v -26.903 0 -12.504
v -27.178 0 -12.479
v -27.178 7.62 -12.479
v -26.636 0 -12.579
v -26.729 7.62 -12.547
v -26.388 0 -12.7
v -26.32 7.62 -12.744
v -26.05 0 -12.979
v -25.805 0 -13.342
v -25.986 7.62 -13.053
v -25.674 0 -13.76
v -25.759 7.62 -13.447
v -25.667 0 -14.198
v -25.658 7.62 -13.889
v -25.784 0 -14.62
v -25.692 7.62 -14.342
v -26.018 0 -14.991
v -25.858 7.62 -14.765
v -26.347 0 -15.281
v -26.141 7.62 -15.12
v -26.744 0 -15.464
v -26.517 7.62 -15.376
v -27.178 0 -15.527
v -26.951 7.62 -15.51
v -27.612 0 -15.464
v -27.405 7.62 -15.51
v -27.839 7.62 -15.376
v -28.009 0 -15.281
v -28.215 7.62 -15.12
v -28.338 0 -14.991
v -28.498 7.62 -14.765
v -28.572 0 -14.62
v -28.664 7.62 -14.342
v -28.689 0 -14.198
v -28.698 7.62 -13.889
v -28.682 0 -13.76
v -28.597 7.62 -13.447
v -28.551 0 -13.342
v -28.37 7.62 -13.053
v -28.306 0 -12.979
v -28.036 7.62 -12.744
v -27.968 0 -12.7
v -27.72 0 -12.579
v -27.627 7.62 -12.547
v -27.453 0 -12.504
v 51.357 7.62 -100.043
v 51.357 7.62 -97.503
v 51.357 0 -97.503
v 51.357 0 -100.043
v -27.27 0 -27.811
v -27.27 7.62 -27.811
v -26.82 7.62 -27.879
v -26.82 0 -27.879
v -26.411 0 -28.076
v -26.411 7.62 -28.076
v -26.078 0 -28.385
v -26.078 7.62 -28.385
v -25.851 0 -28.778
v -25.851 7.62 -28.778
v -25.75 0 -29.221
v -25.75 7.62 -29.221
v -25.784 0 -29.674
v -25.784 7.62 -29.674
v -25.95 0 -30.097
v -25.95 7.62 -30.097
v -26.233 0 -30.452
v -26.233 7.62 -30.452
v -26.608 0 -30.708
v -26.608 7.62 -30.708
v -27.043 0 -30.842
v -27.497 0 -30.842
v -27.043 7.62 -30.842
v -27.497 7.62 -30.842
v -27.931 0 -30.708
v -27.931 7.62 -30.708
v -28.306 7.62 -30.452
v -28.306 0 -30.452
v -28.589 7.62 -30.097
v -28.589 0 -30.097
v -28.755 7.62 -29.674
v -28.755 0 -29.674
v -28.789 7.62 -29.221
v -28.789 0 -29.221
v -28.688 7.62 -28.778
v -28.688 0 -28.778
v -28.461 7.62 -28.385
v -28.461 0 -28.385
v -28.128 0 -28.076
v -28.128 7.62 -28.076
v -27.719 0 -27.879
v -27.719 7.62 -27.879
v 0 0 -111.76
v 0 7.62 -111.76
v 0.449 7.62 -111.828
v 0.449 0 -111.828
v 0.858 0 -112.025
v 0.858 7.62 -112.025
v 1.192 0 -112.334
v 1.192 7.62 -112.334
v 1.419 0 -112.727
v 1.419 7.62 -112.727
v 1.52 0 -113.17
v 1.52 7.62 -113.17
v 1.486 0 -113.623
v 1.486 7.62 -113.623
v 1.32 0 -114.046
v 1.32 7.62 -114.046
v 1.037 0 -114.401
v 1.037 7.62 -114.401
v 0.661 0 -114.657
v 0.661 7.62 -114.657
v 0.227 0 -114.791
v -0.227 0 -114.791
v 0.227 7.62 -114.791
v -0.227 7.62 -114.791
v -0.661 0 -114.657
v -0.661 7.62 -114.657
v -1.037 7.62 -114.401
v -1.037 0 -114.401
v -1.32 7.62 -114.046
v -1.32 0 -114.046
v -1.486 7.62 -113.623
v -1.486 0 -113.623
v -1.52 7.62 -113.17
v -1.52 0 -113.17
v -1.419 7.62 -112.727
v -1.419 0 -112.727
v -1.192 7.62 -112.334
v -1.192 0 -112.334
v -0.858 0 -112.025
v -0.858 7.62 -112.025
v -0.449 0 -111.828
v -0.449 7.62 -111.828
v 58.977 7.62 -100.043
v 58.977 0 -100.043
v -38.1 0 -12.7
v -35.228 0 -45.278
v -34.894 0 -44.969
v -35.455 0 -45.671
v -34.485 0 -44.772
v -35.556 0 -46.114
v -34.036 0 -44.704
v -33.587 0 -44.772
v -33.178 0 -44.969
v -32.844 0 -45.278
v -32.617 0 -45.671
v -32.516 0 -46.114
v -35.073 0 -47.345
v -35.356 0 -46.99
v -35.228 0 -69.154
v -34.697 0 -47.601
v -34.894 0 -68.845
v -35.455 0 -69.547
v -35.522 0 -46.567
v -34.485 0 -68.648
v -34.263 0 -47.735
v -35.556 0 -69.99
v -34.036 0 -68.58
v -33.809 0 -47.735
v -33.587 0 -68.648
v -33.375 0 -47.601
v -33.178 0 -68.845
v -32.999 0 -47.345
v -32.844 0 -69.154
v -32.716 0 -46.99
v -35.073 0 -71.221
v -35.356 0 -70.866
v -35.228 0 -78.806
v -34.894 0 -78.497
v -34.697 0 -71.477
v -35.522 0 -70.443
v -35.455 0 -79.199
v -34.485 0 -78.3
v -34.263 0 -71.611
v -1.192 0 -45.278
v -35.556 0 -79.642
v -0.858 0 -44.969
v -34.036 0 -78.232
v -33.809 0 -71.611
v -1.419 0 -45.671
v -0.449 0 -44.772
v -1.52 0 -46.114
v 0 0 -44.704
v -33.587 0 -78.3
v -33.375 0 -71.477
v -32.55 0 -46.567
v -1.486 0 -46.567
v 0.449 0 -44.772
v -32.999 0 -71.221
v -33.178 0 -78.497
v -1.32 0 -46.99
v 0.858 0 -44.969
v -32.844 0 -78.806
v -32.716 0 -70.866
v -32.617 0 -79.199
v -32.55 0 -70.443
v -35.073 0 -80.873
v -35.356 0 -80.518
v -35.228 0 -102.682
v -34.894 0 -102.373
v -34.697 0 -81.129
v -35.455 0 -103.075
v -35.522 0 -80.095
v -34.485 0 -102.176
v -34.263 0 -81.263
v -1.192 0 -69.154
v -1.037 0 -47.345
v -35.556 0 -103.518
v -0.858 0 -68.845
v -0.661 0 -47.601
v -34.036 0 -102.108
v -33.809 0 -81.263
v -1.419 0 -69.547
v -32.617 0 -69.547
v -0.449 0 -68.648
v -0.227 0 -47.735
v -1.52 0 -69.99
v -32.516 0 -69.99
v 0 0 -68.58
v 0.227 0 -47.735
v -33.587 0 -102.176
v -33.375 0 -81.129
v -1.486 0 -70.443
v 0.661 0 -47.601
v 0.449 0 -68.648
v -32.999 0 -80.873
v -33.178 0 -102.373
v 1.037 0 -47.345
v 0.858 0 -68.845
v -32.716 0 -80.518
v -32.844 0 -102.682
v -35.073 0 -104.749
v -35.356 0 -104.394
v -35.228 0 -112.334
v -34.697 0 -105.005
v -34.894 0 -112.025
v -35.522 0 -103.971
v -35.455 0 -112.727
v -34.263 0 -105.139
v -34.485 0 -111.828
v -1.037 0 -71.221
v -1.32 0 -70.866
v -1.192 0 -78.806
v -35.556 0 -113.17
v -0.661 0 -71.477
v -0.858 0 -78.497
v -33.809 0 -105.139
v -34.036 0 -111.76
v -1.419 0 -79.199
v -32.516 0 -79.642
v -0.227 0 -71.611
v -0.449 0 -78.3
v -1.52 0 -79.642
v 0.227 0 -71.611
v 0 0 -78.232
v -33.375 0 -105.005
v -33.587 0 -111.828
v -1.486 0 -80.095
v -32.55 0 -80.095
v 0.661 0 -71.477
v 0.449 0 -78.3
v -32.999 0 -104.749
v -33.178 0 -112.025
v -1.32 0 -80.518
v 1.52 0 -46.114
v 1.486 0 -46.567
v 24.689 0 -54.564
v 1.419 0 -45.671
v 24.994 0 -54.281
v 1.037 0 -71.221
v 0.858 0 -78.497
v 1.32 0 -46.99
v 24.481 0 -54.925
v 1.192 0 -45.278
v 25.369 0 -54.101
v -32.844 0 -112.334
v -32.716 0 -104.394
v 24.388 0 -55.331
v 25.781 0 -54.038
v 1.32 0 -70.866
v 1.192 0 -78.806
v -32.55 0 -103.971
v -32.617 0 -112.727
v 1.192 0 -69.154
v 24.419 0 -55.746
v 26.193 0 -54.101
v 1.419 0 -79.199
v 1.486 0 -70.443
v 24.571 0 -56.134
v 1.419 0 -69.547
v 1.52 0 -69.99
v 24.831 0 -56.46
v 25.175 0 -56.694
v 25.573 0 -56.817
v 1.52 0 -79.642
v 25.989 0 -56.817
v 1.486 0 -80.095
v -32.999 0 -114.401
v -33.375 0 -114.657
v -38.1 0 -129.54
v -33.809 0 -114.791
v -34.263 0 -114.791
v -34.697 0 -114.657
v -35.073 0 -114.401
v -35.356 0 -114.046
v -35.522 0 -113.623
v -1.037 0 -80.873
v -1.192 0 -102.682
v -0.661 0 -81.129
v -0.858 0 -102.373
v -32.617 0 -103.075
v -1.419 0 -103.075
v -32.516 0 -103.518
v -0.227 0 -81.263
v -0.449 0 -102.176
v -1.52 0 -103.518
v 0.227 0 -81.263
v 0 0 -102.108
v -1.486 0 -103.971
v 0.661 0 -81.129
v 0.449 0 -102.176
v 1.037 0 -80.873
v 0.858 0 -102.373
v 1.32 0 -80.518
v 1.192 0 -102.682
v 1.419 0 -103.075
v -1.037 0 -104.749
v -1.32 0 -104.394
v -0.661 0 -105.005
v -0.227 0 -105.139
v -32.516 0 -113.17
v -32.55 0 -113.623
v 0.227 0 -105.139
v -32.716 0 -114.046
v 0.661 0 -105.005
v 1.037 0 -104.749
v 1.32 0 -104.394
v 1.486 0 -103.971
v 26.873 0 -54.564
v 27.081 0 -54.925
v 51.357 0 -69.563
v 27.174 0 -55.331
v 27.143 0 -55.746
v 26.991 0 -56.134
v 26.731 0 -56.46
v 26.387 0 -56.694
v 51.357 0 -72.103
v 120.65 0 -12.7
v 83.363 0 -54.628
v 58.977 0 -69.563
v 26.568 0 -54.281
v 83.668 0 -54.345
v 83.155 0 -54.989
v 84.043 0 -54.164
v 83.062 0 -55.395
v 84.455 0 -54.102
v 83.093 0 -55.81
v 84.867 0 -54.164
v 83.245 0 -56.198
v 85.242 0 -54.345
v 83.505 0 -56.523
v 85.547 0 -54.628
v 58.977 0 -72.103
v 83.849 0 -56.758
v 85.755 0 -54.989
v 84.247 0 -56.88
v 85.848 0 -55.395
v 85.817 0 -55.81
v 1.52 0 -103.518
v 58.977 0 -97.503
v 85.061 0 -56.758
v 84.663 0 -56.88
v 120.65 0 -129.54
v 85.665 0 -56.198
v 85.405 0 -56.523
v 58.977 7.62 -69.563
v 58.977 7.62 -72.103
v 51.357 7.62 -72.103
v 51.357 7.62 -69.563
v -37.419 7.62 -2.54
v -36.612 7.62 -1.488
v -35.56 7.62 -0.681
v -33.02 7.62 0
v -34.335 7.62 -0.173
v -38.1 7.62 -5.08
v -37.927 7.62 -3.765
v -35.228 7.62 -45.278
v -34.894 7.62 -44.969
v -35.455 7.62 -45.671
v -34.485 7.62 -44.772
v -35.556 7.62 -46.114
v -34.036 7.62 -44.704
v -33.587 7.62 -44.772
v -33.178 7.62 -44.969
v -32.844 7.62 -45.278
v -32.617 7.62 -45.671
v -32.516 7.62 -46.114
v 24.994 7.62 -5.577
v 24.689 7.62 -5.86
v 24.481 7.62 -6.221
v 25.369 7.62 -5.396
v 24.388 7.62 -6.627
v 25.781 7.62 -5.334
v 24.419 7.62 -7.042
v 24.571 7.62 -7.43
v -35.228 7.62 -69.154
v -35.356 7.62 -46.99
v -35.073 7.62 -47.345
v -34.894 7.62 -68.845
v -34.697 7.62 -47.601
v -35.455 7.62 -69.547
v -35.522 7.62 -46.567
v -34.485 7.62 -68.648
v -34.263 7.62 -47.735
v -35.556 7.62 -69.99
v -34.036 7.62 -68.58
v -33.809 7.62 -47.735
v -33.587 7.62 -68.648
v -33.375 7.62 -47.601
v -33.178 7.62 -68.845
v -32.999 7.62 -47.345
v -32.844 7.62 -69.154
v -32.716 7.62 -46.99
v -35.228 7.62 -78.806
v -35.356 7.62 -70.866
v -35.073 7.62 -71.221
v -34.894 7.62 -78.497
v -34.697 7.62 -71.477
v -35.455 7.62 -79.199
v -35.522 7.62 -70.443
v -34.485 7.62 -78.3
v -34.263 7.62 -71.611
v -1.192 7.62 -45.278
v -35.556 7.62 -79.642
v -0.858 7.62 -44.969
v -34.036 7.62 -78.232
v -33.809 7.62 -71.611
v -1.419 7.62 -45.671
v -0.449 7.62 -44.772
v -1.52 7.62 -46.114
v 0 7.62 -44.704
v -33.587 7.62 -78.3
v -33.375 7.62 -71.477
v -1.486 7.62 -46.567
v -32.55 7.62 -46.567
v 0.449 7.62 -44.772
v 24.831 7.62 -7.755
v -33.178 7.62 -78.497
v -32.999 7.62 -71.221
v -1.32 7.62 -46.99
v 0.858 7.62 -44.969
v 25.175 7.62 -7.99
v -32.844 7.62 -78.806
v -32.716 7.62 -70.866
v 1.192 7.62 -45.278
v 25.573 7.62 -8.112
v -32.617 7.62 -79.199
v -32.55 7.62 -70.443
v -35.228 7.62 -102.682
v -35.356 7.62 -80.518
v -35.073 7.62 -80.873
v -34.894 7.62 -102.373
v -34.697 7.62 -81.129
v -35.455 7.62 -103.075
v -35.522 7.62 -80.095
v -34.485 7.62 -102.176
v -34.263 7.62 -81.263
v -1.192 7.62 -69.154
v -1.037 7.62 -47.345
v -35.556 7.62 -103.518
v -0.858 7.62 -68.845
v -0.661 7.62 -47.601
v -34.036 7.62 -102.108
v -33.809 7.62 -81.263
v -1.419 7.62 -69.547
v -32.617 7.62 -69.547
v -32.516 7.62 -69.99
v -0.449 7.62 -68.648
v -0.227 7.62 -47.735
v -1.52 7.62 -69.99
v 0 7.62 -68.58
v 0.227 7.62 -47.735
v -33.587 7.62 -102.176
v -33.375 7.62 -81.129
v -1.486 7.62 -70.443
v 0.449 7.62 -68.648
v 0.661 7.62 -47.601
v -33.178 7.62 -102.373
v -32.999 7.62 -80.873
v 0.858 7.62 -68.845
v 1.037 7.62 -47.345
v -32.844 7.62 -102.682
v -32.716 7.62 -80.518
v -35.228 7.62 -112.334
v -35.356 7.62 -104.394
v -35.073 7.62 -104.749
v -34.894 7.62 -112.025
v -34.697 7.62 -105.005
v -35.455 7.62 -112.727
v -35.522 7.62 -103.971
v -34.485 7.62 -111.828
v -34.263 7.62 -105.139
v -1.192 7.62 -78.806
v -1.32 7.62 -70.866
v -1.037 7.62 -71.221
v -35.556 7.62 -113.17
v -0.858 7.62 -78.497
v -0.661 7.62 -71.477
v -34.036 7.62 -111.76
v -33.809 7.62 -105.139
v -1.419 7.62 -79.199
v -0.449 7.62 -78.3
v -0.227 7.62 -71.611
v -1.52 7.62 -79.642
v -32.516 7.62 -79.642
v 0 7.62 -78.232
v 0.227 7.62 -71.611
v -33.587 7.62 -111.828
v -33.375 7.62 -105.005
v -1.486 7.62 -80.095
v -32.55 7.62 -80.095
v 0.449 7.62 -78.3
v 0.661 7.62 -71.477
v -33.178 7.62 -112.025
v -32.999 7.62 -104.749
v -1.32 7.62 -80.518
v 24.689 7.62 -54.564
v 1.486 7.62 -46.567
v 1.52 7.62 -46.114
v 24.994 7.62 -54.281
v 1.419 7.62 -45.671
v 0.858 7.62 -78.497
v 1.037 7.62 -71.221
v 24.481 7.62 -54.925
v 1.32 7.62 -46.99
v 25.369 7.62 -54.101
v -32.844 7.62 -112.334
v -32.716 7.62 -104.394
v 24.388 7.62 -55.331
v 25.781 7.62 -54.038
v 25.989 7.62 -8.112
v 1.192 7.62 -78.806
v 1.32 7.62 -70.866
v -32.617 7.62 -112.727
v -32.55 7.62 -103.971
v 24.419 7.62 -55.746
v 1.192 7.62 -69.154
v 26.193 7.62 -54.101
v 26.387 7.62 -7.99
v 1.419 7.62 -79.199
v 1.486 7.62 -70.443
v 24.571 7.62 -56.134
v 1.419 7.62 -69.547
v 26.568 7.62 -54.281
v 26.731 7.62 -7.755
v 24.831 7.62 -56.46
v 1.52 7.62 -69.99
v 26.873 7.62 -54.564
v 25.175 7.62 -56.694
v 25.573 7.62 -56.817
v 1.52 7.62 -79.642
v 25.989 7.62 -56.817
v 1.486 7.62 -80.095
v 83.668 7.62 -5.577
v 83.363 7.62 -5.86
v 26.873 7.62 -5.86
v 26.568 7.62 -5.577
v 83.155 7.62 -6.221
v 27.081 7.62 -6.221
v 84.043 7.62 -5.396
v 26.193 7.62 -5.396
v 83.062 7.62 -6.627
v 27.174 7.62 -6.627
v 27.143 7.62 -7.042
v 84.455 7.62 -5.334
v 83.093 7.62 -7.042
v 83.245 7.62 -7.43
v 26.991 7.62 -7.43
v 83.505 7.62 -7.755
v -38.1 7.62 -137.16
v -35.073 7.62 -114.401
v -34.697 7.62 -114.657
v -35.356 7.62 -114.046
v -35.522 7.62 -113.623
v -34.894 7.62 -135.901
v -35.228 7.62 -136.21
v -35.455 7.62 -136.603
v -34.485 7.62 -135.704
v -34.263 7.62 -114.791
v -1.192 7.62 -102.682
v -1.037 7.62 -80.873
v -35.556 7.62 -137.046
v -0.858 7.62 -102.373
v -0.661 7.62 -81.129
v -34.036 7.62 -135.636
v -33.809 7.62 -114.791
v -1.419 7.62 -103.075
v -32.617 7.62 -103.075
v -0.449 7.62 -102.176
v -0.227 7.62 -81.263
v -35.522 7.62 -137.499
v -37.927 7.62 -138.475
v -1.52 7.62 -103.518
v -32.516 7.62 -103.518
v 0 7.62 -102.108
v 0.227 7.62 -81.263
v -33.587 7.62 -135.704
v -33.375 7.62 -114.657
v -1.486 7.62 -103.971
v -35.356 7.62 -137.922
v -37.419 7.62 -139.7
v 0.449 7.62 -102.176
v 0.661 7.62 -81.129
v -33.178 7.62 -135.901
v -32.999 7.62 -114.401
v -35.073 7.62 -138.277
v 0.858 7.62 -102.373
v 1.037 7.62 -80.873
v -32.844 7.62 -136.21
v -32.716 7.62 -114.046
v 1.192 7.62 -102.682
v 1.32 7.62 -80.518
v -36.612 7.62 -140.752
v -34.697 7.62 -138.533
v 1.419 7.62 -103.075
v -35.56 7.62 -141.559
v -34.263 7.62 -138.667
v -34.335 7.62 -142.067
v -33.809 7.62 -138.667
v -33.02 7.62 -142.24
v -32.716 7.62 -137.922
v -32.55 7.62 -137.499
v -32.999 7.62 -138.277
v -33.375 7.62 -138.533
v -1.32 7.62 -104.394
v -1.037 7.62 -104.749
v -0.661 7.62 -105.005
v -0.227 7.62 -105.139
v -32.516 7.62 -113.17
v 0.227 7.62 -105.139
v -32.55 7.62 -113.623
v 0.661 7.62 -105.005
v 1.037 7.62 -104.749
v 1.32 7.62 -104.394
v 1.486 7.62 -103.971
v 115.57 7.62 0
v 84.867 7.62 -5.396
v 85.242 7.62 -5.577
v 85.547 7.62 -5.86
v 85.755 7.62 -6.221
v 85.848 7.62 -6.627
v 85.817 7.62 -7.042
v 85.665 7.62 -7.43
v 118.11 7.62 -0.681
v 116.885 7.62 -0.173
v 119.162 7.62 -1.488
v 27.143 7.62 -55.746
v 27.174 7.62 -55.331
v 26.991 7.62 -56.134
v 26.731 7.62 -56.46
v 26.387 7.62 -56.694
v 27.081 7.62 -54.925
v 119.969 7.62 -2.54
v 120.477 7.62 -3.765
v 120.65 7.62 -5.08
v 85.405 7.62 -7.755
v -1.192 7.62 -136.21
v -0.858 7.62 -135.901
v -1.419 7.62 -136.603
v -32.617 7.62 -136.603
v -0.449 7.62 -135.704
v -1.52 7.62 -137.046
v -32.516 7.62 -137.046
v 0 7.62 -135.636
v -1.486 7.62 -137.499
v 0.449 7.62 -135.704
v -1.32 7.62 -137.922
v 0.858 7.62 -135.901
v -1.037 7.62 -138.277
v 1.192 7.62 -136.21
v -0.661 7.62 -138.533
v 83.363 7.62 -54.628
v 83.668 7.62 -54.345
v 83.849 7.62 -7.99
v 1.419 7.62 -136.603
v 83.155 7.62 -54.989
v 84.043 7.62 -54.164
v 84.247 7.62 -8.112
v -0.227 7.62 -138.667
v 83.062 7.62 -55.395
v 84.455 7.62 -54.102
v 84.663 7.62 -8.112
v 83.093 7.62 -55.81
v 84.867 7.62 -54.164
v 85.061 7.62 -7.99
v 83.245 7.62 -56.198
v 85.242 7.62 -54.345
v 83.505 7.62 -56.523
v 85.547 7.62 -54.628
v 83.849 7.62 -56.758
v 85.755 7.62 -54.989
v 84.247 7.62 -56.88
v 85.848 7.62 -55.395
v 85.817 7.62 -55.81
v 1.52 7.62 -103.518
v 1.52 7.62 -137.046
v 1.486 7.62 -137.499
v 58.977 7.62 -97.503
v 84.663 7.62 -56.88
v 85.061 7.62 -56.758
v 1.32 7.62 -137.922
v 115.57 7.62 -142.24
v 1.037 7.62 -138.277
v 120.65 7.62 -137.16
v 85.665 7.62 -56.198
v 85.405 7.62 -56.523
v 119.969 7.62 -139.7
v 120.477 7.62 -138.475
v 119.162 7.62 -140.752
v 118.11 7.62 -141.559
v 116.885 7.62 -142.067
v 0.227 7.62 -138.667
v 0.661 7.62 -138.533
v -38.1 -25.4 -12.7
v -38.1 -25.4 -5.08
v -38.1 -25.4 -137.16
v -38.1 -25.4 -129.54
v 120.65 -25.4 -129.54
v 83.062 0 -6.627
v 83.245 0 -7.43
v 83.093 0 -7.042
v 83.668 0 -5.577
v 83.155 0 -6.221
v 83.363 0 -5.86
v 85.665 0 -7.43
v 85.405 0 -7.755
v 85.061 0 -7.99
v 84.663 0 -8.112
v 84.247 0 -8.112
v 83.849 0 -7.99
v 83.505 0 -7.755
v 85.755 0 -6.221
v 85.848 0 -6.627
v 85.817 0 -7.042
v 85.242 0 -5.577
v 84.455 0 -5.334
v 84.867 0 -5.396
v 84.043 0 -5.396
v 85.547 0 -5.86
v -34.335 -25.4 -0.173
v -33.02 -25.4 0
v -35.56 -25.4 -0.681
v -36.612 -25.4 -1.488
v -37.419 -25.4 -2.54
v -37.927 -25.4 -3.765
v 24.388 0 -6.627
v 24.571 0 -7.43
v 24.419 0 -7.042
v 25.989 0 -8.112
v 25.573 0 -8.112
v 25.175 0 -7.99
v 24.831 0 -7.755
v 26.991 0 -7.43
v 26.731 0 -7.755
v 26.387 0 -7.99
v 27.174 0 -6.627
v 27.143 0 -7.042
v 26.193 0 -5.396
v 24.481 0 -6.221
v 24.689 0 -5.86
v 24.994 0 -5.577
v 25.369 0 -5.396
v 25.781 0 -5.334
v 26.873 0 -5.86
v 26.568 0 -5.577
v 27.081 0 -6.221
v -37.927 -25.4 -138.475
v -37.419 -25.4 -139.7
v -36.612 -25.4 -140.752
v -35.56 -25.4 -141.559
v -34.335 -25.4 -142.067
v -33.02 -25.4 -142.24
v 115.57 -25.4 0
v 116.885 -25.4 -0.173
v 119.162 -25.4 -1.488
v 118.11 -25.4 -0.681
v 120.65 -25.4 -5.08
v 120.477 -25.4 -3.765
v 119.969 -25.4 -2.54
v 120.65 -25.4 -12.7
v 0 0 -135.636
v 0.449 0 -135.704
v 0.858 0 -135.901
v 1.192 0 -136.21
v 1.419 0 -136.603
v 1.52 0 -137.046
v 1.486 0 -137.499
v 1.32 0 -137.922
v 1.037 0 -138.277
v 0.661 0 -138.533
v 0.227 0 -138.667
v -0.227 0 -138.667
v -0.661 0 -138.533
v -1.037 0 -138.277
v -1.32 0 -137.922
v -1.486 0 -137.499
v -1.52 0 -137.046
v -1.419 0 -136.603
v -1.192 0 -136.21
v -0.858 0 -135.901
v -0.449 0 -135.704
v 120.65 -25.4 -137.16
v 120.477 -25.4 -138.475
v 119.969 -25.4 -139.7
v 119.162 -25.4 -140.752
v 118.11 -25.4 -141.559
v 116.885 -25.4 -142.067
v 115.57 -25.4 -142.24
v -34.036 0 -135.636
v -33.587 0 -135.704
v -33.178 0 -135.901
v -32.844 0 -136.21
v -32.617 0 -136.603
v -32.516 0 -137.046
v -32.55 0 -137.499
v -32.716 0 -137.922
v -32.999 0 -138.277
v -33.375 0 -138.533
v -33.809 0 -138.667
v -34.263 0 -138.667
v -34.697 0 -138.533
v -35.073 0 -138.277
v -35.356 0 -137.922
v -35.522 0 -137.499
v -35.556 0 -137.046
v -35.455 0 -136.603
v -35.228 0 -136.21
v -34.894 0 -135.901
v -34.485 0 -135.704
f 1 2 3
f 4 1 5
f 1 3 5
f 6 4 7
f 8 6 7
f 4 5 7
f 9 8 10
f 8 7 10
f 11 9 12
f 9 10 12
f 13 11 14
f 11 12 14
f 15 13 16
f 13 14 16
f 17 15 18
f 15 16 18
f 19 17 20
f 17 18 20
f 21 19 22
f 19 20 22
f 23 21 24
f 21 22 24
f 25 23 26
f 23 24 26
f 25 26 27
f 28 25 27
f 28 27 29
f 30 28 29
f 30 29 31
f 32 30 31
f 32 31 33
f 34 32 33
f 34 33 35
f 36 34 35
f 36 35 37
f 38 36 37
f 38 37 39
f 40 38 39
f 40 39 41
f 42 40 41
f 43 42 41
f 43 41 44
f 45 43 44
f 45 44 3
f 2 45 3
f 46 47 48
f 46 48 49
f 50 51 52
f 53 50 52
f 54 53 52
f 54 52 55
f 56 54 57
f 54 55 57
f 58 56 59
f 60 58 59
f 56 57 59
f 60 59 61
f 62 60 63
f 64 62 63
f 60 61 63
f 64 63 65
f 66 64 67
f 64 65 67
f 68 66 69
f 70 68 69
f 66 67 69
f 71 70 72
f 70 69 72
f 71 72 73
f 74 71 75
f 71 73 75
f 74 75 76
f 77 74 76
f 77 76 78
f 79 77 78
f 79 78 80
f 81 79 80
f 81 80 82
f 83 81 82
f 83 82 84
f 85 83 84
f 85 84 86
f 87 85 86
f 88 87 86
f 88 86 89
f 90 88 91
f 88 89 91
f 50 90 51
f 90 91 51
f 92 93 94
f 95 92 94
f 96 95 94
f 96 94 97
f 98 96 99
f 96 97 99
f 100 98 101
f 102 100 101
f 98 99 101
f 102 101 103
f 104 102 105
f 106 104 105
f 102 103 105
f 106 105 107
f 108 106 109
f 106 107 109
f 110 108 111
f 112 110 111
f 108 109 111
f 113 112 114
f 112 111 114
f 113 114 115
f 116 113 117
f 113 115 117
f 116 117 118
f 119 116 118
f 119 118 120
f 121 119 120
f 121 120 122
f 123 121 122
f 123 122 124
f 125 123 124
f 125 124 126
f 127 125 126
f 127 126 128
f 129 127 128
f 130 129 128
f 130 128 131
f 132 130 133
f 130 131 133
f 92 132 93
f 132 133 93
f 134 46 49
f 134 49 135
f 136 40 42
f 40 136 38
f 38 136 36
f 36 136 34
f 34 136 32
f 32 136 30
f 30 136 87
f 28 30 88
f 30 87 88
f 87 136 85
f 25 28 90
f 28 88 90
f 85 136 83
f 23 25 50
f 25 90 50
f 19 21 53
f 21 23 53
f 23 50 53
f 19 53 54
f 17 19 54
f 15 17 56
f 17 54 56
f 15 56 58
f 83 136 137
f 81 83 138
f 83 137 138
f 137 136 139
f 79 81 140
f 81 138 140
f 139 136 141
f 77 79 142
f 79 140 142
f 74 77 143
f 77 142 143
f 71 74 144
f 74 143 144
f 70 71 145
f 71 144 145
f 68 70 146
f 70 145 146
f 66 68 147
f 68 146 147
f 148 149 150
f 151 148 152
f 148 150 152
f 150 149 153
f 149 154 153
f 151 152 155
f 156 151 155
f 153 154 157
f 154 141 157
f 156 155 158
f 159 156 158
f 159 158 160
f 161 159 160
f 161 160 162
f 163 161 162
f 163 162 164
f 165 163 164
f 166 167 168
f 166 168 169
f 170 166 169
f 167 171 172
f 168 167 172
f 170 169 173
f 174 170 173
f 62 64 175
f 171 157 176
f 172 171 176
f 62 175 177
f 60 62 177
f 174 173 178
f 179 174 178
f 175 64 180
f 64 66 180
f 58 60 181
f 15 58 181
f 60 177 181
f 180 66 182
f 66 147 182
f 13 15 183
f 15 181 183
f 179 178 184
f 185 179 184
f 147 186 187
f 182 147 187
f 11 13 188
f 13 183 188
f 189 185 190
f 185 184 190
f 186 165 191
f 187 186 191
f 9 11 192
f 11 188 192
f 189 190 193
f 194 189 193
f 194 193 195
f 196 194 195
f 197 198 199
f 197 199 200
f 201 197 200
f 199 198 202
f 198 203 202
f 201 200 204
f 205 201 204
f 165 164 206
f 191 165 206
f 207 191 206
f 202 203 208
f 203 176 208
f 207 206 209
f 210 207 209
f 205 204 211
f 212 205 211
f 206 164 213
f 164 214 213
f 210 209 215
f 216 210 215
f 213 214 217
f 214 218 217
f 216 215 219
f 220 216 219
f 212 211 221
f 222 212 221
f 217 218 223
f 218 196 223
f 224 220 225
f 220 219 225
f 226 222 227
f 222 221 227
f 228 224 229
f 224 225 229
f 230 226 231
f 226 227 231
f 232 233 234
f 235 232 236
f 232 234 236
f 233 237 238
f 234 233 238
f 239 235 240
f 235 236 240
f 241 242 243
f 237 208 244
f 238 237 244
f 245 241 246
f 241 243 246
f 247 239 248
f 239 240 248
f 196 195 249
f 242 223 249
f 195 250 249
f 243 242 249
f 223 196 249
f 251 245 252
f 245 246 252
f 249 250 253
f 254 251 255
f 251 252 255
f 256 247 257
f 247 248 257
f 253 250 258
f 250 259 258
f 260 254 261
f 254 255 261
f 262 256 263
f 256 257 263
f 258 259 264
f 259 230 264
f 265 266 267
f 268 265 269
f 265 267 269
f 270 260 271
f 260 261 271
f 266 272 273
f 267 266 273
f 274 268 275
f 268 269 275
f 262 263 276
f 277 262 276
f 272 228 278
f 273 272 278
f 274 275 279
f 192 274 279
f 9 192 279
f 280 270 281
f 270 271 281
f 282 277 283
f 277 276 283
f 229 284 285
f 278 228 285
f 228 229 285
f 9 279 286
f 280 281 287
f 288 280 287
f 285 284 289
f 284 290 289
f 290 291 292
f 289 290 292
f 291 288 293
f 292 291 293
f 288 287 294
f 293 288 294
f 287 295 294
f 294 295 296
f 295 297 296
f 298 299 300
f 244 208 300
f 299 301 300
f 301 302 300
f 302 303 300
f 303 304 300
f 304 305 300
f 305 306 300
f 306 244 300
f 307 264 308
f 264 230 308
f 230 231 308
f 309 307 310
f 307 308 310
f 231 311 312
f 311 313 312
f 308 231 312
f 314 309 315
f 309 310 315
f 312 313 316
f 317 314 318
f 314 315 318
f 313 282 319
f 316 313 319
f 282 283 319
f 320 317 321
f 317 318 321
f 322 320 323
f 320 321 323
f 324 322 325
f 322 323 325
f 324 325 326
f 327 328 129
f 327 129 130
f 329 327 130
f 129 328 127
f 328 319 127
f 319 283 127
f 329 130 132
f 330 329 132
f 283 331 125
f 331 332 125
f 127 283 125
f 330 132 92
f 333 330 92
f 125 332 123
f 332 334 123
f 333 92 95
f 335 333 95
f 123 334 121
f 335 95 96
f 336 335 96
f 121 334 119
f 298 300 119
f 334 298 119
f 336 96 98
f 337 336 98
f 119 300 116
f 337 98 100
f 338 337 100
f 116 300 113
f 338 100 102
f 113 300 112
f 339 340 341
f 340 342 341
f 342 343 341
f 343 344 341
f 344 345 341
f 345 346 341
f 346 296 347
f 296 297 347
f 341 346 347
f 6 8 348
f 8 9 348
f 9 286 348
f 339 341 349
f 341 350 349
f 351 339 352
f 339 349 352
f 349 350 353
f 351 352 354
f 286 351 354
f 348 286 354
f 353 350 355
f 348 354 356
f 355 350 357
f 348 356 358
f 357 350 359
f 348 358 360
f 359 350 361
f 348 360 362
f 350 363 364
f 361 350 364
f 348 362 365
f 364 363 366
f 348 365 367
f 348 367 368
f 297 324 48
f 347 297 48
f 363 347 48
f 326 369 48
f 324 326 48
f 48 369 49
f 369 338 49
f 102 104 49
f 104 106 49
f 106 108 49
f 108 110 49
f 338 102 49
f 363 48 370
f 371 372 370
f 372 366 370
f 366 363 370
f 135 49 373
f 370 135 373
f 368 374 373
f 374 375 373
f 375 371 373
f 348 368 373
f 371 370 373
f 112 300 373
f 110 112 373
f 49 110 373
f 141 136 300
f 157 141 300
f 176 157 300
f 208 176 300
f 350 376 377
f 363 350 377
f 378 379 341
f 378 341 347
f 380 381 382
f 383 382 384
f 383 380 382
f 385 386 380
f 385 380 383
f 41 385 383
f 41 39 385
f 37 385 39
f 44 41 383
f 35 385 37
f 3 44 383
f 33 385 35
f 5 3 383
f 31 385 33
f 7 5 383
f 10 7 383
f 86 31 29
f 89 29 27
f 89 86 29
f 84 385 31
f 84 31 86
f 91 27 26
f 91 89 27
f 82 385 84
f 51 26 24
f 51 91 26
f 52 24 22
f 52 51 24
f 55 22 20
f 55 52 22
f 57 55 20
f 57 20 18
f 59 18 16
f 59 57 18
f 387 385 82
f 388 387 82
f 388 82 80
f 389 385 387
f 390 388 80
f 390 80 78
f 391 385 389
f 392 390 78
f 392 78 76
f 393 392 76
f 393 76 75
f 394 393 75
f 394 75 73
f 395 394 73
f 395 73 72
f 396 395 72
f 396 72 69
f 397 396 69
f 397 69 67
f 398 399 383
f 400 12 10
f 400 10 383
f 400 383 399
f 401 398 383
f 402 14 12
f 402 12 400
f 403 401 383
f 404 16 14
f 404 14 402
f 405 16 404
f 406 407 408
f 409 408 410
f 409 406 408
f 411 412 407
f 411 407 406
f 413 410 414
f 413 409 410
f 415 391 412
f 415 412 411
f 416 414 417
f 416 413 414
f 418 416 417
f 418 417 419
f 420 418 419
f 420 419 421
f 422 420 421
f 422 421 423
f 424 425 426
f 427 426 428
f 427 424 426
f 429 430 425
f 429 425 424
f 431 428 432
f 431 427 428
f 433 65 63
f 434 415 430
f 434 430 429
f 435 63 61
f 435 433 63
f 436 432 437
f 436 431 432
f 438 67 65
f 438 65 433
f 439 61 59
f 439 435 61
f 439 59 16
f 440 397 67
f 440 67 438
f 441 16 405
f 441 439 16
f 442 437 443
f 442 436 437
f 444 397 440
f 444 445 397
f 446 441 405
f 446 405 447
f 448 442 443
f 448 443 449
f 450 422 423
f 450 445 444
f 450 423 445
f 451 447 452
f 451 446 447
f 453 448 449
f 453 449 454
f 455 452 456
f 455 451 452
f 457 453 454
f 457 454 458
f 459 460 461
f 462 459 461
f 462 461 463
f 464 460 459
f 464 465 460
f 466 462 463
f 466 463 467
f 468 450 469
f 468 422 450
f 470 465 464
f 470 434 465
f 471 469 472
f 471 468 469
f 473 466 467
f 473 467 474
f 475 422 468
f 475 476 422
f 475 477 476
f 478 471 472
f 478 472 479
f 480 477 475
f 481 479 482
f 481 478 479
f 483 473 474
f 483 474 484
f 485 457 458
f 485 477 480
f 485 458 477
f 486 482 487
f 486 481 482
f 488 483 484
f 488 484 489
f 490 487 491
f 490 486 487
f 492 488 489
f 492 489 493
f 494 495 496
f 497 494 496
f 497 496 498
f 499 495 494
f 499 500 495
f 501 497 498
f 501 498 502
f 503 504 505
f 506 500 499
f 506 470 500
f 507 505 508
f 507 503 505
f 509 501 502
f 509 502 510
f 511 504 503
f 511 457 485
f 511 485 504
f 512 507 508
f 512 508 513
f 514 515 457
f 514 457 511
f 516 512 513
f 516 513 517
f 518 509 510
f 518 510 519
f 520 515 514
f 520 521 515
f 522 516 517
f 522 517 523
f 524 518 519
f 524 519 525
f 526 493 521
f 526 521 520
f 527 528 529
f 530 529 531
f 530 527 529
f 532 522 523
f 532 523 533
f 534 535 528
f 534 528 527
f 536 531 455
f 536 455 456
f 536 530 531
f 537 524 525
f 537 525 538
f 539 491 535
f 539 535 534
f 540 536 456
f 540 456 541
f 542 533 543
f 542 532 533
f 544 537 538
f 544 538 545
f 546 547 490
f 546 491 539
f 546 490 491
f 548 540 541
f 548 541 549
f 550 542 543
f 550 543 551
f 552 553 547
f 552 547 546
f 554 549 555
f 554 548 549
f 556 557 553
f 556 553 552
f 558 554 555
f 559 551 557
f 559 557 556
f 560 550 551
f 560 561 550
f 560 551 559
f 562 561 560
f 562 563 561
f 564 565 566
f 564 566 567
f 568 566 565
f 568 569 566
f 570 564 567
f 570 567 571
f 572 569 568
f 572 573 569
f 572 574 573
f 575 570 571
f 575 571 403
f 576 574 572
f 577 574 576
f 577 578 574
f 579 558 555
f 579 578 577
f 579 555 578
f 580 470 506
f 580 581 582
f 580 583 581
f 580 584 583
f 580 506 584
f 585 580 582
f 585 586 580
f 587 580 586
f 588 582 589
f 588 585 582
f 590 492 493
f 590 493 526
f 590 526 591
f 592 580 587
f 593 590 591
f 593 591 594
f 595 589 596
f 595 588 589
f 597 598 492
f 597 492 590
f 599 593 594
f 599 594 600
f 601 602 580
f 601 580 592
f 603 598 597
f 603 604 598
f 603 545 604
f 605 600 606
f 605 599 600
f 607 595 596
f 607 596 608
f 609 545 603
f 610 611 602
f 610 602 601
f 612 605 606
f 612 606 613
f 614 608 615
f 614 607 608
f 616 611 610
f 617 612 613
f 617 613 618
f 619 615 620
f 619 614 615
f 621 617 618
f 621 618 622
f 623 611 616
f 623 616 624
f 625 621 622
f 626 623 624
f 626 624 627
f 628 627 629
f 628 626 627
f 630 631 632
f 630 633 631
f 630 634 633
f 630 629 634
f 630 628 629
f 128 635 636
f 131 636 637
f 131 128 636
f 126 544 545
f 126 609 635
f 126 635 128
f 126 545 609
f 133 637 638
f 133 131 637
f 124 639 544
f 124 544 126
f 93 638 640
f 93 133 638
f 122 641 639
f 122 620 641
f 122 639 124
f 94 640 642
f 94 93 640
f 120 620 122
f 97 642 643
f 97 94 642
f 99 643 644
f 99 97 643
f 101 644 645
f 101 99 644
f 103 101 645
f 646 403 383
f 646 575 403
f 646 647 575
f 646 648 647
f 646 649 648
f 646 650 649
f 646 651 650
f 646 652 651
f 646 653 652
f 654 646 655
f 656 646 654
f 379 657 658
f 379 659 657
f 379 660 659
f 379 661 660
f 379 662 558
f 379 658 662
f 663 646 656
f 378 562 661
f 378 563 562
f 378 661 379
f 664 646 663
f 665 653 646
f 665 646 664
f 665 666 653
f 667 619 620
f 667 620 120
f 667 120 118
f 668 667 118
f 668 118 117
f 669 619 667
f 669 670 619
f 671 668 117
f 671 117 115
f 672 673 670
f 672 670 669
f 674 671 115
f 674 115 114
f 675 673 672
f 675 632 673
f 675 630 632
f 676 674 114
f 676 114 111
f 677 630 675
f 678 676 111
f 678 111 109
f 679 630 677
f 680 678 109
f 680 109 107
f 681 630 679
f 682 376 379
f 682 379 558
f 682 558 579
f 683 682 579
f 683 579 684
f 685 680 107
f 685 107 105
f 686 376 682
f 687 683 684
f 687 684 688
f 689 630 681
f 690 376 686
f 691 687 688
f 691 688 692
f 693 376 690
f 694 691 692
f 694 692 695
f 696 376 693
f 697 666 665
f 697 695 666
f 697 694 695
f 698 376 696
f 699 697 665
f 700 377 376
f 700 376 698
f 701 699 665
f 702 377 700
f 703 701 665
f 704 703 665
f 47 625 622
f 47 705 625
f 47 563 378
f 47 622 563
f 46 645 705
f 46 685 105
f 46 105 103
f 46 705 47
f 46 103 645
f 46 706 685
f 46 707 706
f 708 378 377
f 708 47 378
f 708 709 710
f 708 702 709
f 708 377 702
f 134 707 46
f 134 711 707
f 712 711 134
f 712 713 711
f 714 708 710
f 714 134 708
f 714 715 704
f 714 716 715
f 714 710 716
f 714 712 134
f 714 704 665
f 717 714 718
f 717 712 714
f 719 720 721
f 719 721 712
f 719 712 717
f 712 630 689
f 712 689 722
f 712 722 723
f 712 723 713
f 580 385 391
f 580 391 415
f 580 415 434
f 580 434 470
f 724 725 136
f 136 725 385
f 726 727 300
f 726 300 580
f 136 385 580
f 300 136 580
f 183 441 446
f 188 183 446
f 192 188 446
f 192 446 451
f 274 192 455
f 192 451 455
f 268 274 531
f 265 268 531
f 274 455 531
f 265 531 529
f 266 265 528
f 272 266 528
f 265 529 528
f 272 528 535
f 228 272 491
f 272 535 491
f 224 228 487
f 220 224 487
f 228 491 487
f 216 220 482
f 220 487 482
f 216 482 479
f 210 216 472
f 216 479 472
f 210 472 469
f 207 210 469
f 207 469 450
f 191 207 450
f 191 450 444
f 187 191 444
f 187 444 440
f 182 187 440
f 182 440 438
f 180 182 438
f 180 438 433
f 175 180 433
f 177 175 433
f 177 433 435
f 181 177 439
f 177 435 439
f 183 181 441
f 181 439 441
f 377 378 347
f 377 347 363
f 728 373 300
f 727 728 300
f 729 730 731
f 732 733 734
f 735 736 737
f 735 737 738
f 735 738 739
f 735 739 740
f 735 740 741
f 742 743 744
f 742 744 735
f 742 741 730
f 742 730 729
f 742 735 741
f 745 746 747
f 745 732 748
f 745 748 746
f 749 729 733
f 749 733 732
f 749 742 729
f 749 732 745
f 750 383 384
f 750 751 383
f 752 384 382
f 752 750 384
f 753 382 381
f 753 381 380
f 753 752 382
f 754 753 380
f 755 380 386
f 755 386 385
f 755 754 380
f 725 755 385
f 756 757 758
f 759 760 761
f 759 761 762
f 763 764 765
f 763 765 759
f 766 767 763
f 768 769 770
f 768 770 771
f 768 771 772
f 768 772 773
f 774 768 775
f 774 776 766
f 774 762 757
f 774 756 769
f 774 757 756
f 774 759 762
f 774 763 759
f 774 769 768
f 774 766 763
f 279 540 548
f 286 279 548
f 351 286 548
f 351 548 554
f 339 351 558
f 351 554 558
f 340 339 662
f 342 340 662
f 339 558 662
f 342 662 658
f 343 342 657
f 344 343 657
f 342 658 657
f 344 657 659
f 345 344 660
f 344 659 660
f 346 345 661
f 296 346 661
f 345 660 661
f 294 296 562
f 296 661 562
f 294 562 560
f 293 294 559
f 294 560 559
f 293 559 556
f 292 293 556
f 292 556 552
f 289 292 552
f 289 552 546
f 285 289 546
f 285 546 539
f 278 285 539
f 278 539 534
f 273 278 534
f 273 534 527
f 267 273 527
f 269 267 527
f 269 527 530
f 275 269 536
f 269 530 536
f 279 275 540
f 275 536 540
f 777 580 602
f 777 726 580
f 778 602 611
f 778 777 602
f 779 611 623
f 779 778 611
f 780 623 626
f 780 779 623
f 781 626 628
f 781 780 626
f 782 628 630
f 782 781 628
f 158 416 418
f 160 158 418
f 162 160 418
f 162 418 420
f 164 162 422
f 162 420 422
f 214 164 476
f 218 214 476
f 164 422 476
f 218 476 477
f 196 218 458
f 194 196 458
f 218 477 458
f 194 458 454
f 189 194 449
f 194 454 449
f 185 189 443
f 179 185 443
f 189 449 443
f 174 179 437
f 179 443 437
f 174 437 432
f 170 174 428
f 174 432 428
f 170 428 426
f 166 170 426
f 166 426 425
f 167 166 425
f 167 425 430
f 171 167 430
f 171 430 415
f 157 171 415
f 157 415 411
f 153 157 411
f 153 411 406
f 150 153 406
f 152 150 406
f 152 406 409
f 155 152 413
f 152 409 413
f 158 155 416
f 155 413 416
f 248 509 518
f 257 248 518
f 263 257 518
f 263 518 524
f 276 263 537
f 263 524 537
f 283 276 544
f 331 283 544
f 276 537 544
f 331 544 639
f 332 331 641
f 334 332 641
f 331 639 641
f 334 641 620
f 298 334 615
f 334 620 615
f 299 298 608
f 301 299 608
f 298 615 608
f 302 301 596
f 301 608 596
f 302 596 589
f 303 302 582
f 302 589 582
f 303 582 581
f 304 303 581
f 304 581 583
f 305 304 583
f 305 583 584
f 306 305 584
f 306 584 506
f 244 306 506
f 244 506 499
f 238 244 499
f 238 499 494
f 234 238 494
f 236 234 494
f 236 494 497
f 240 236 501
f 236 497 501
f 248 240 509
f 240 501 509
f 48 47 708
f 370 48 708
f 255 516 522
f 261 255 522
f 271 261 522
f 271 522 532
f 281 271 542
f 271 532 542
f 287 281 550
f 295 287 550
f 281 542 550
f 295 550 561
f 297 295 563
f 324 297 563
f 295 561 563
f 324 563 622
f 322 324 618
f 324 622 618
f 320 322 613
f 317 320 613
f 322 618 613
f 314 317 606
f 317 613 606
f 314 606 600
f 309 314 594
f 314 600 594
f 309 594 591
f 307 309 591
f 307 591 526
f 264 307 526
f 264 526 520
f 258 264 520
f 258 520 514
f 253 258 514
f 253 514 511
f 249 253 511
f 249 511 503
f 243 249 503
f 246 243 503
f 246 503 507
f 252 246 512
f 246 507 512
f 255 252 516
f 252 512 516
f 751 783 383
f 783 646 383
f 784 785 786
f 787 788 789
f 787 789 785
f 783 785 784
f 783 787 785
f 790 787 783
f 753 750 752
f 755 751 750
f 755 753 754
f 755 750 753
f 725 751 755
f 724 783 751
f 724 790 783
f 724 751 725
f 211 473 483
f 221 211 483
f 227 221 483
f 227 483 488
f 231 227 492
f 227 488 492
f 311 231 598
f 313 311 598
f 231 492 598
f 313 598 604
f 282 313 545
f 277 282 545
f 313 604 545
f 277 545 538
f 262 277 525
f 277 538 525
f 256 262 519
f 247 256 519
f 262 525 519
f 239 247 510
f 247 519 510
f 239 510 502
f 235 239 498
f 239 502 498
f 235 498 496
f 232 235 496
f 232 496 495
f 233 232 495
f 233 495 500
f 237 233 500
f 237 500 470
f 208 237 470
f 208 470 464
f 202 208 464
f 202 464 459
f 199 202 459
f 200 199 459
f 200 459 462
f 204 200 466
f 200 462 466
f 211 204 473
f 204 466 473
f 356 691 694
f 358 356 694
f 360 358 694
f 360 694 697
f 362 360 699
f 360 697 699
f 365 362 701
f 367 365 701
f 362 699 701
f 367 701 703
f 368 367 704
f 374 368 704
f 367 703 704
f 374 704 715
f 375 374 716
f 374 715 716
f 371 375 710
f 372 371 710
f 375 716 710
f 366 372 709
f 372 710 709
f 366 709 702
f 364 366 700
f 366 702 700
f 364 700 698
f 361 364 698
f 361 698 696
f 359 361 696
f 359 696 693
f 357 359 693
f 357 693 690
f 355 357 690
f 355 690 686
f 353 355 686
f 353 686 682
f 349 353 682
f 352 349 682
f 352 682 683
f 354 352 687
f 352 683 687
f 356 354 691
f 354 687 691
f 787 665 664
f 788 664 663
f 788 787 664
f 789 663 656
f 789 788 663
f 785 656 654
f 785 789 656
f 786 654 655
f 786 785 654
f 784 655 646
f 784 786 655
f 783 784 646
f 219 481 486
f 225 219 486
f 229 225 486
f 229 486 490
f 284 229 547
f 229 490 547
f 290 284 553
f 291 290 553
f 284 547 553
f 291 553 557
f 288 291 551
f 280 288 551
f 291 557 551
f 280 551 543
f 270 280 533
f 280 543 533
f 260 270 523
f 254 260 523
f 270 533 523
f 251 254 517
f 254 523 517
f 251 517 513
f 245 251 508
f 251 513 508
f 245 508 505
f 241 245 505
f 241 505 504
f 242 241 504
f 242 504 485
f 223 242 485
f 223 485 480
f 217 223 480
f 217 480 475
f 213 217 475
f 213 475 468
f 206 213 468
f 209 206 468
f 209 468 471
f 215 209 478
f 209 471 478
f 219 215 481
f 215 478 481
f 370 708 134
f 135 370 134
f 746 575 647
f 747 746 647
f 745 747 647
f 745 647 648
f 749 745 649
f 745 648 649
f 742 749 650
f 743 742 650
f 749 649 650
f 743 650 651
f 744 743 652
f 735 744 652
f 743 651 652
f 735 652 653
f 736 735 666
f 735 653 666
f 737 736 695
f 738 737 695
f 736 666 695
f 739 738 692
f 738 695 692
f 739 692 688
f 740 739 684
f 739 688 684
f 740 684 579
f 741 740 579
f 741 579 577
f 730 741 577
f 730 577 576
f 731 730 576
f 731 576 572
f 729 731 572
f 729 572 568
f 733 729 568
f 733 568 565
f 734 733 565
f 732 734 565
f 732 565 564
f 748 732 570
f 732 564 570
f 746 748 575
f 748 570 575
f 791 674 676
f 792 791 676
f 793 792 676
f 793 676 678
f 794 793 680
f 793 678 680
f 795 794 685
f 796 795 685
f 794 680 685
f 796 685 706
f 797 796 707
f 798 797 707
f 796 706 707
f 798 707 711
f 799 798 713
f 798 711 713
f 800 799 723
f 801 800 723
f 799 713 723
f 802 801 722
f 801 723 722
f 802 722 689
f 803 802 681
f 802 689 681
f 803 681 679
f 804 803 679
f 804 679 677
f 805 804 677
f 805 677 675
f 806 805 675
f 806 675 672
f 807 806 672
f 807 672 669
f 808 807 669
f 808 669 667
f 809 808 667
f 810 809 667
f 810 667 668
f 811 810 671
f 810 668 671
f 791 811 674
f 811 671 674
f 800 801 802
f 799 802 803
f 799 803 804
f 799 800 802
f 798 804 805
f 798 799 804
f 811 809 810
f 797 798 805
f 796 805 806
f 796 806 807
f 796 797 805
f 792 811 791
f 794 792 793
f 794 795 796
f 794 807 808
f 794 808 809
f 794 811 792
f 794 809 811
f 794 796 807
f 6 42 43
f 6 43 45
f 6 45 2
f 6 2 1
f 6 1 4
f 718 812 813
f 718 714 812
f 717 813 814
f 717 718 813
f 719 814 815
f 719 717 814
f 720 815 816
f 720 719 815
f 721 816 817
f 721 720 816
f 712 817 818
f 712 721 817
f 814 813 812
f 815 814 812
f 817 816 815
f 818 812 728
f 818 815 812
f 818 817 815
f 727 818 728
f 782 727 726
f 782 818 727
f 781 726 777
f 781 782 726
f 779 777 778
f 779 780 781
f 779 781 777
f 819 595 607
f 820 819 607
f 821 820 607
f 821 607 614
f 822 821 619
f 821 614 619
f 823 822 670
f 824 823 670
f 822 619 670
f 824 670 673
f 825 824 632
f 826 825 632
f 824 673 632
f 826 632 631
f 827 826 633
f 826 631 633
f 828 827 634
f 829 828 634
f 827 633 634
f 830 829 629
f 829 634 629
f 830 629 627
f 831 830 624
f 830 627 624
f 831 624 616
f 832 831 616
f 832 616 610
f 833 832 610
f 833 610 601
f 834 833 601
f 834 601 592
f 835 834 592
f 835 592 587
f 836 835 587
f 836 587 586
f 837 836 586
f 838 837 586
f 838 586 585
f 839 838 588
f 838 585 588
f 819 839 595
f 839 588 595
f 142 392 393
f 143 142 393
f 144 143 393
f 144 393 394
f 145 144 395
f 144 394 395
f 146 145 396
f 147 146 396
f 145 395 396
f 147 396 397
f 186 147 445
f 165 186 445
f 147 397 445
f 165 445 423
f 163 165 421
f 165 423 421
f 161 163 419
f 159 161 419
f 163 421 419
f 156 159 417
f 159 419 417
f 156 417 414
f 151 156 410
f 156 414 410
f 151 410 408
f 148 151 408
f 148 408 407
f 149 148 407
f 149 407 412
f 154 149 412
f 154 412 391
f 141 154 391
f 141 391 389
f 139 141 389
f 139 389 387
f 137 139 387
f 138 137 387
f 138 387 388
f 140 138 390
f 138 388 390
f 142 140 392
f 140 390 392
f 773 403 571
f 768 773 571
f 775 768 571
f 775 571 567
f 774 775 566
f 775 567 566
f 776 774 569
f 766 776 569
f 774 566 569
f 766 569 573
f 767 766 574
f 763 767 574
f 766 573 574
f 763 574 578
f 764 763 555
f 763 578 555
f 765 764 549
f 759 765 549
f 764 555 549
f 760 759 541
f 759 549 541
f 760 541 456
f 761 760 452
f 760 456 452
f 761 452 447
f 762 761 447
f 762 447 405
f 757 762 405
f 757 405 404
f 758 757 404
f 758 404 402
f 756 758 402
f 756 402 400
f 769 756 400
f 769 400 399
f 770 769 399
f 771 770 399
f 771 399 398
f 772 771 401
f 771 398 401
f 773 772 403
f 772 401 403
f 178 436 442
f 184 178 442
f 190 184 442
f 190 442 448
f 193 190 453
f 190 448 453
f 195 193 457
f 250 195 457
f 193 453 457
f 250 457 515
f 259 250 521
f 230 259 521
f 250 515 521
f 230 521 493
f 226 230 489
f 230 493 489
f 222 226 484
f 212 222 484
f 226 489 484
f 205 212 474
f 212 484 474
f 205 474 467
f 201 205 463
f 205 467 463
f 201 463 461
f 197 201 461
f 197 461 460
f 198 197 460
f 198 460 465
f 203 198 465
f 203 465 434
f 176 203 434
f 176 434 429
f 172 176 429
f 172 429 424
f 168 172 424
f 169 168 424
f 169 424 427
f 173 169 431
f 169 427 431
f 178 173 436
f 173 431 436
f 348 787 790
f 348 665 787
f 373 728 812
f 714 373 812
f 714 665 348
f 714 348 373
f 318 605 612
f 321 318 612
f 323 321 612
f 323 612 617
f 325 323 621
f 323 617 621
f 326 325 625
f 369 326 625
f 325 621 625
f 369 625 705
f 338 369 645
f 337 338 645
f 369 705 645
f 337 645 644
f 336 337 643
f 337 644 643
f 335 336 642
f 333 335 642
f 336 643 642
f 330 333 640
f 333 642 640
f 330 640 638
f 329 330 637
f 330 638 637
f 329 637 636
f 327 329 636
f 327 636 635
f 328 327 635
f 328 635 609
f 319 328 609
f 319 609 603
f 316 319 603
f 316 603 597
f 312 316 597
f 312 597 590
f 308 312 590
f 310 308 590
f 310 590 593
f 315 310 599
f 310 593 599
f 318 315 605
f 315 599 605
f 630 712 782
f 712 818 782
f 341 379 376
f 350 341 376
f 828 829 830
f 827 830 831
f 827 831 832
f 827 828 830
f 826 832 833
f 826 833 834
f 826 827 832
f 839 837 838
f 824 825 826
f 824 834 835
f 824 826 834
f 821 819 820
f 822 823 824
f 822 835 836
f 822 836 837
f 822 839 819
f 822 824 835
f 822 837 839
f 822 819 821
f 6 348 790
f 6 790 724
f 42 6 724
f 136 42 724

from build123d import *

# Parameters (mm, degrees)
BOSS_EXTRUDE1_DEPTH = 7.62
SKETCH5_W           = 158.75
SKETCH5_H           = 12.7
BOSS_EXTRUDE2_DEPTH = 25.4
FILLET1_R           = 5.08
SKETCH3_R           = 1.397
SKETCH3_R_2         = 1.524
CUT_EXTRUDE1_DEPTH  = 7.62
SKETCH6_W           = 7.62
SKETCH6_H           = 2.54
CUT_EXTRUDE3_DEPTH  = 7.62


with BuildPart() as part:
    # Sketch1 → Boss-Extrude1 (new body)
    with BuildSketch(Plane(origin=(0, 0, 0), x_dir=(1, 0, 0), z_dir=(0, 1, 0))):
        Polygon((0, 0), (120.65, 0), (120.65, 142.24), (-38.1, 142.24), (-38.1, 0), align=None)
    extrude(amount=BOSS_EXTRUDE1_DEPTH)

    # Sketch5 → Boss-Extrude2 (add)
    with BuildSketch(Plane(origin=(0, 0, 0), x_dir=(-1, 0, 0), z_dir=(0, -1, 0))):
        with Locations((-41.275, 6.35)):
            Rectangle(SKETCH5_W, SKETCH5_H)
        with Locations((-41.275, 135.89)):
            Rectangle(SKETCH5_W, SKETCH5_H)
    extrude(amount=BOSS_EXTRUDE2_DEPTH)

    # Fillet1
    fillet1_edges = [part.edges().sort_by_distance(p)[0] for p in [
        (-38.1, -8.89, 0),
        (120.65, -8.89, 0),
        (120.65, -8.89, -142.24),
        (-38.1, -8.89, -142.24),
    ]]
    fillet(fillet1_edges, radius=FILLET1_R)

    # Sketch3 → Cut-Extrude1 (cut)
    with BuildSketch(Plane(origin=(0, 7.62, 0), x_dir=(1, 0, 0), z_dir=(0, 1, 0))):
        with Locations((25.781, 6.731)):
            Circle(SKETCH3_R)
        with Locations((25.781, 55.4355)):
            Circle(SKETCH3_R)
        with Locations((84.455, 55.499)):
            Circle(SKETCH3_R)
        with Locations((84.455, 6.731)):
            Circle(SKETCH3_R)
        with Locations((-34.036, 137.16)):
            Circle(SKETCH3_R_2)
        with Locations((0, 137.16)):
            Circle(SKETCH3_R_2)
        with Locations((-34.036, 113.284)):
            Circle(SKETCH3_R_2)
        with Locations((0, 113.284)):
            Circle(SKETCH3_R_2)
        with Locations((-34.036, 103.632)):
            Circle(SKETCH3_R_2)
        with Locations((0, 103.632)):
            Circle(SKETCH3_R_2)
        with Locations((-34.036, 79.756)):
            Circle(SKETCH3_R_2)
        with Locations((0, 79.756)):
            Circle(SKETCH3_R_2)
        with Locations((-34.036, 70.104)):
            Circle(SKETCH3_R_2)
        with Locations((0, 70.104)):
            Circle(SKETCH3_R_2)
        with Locations((-34.036, 46.228)):
            Circle(SKETCH3_R_2)
        with Locations((0, 46.228)):
            Circle(SKETCH3_R_2)
        with Locations((-27.178, 14.003291804)):
            Circle(SKETCH3_R_2)
        with Locations((-27.269651582, 29.334943362)):
            Circle(SKETCH3_R_2)
    extrude(amount=-CUT_EXTRUDE1_DEPTH, mode=Mode.SUBTRACT)

    # Sketch6 → Cut-Extrude3 (cut)
    with BuildSketch(Plane(origin=(0, 7.62, 0), x_dir=(1, 0, 0), z_dir=(0, 1, 0))):
        with Locations((55.167188758, 70.832515898)):
            Rectangle(SKETCH6_W, SKETCH6_H)
        with Locations((55.167188758, 98.772515898)):
            Rectangle(SKETCH6_W, SKETCH6_H)
    extrude(amount=-CUT_EXTRUDE3_DEPTH, mode=Mode.SUBTRACT)


solid = part.part
